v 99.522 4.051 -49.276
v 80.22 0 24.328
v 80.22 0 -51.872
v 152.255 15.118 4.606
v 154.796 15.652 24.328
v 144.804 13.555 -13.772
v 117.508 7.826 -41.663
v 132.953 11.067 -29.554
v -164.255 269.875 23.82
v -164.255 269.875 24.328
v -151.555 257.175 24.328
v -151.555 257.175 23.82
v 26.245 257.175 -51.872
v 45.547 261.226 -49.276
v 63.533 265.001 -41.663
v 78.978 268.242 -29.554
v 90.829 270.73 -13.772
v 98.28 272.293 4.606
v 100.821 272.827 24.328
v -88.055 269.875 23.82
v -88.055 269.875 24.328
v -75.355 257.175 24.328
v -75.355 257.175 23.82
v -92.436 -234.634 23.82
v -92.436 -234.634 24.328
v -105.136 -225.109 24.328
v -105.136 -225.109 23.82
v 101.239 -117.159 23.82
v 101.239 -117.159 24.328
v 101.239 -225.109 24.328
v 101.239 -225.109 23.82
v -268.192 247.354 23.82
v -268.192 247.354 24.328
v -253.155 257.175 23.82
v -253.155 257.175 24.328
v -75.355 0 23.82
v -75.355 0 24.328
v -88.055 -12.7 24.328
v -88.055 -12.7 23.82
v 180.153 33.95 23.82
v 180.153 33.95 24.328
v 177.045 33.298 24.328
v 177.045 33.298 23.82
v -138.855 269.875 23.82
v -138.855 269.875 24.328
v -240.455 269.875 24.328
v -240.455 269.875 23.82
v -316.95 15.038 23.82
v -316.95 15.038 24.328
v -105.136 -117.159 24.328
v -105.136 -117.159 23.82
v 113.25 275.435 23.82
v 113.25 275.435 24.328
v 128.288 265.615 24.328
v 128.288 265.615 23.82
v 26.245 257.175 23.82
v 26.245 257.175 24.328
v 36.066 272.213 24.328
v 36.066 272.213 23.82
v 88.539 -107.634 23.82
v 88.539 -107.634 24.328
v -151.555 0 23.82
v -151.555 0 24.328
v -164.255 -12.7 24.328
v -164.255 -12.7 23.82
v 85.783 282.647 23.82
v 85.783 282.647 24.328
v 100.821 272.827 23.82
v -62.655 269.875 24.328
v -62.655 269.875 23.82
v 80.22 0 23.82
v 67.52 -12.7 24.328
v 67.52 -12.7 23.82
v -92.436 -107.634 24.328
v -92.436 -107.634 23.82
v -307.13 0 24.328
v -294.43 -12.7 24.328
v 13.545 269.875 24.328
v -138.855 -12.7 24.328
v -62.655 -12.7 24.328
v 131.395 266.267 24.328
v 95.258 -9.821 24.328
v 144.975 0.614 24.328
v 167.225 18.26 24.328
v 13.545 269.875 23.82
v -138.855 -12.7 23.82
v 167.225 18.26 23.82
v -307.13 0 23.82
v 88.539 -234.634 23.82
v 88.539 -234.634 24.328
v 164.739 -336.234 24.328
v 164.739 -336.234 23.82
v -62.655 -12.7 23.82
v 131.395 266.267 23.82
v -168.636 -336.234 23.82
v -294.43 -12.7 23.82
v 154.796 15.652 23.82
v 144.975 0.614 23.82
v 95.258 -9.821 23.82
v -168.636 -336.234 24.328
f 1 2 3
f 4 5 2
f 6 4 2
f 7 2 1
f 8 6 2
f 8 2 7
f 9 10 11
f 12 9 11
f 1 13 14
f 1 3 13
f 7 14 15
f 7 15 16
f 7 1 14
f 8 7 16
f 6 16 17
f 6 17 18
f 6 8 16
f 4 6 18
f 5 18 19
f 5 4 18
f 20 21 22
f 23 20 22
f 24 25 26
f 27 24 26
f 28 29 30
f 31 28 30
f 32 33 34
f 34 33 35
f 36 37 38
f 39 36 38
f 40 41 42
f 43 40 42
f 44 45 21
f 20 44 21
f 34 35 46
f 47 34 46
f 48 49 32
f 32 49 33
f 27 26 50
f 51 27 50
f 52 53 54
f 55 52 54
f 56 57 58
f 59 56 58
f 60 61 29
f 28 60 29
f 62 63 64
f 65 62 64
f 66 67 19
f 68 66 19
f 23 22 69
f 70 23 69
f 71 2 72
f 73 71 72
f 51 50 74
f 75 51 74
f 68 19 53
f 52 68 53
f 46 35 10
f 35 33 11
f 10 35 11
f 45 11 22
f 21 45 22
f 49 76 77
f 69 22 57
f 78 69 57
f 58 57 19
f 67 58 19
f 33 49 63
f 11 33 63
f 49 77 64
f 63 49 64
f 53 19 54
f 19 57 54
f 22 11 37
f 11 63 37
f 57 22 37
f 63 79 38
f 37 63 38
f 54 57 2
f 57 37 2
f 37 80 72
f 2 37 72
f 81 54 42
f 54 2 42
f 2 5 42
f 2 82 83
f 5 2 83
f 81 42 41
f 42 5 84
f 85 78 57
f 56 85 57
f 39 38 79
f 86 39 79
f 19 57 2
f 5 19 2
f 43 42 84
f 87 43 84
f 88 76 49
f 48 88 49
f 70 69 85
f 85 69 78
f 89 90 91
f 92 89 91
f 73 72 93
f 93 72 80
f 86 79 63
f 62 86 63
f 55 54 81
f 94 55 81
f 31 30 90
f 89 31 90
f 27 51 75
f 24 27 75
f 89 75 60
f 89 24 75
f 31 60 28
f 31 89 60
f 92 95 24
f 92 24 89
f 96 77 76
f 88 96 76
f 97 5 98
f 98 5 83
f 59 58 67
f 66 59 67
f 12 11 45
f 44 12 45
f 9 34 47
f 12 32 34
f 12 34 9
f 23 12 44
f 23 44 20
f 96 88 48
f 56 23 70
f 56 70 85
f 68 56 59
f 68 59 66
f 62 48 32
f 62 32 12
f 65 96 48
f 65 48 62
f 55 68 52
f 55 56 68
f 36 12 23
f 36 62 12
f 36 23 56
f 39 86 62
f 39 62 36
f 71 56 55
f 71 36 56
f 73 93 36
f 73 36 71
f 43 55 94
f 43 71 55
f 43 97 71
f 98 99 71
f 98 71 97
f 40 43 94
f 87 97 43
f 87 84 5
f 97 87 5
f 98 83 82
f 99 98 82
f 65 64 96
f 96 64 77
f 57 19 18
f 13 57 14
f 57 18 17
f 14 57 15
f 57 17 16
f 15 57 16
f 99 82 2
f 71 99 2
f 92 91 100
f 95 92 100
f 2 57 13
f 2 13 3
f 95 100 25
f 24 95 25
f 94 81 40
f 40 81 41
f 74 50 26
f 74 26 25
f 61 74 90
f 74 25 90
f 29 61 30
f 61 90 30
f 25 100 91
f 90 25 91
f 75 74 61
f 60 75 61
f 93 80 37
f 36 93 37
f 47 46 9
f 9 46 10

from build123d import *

# Parameters (mm, degrees)
F9_W      = 262.7780075463
F9_H      = 76.2
F10_ANGLE = 90
F11_W     = 76.2
F11_H     = 257.175
F12_DEPTH = 0.508
F11_W_2   = 180.975
F11_H_2   = 101.6


with BuildPart() as f10:
    # F9 (on face) → F10 (revolve)
    with BuildSketch(Plane(origin=(76.8359391057, 16.1260612938, 0), x_dir=(0.2054015117, -0.9786777912, 0), z_dir=(-0.9786777912, -0.2054015117, 0))):
        with Locations((-114.9116080063, -13.7723366184)):
            Rectangle(F9_W, F9_H)
    revolve(axis=Axis((53.2329211056, 128.5875, 24.3276633816), (0.2054015117, -0.9786777912, 0)), revolution_arc=F10_ANGLE)


with BuildPart() as f12:
    # F11 (on face) → F12 (new body)
    with BuildSketch(Plane(origin=(0, 0, 24.3276633816), x_dir=(1, 0, 0), z_dir=(0, 0, -1))):
        Polygon((80.2204211056, 0), (26.2454211056, -257.175), (100.8206687947, -272.826595194), (154.7956687947, -15.651595194), align=None)
        Polygon((-75.3545788944, -257.175), (26.2454211056, -257.175), (80.2204211056, 0), (-75.3545788944, 0), align=None)
        Polygon((13.5454211056, -269.875), (26.2454211056, -257.175), (-75.3545788944, -257.175), (-62.6545788944, -269.875), align=None)
        Polygon((100.8206687947, -272.826595194), (26.2454211056, -257.175), (36.0660298548, -272.2128071472), (85.7828616475, -282.6472039432), align=None)
        Polygon((154.7956687947, -15.651595194), (100.8206687947, -272.826595194), (113.2498767428, -275.435194393), (167.2248767428, -18.260194393), align=None)
        Polygon((95.2582282528, 9.8206087492), (80.2204211056, 0), (154.7956687947, -15.651595194), (144.9750600455, -0.6137880468), align=None)
        Polygon((-75.3545788944, 0), (80.2204211056, 0), (67.5204211056, 12.7), (-62.6545788944, 12.7), align=None)
        Polygon((-88.0545788944, -269.875), (-75.3545788944, -257.175), (-151.5545788944, -257.175), (-138.8545788944, -269.875), align=None)
        with Locations((-113.4545788944, -128.5875)):
            Rectangle(F11_W, F11_H)
        Polygon((167.2248767428, -18.260194393), (113.2498767428, -275.435194393), (128.28768389, -265.6145856438), (177.045485492, -33.2980015402), align=None)
        Polygon((-151.5545788944, 0), (-75.3545788944, 0), (-88.0545788944, 12.7), (-138.8545788944, 12.7), align=None)
        Polygon((-253.1545788944, -257.175), (-151.5545788944, -257.175), (-151.5545788944, 0), (-307.1295788944, 0), align=None)
        Polygon((-164.2545788944, -269.875), (-151.5545788944, -257.175), (-253.1545788944, -257.175), (-240.4545788944, -269.875), align=None)
        Polygon((177.045485492, -33.2980015402), (128.28768389, -265.6145856438), (131.3949858771, -266.2667354436), (180.1527874791, -33.9501513399), align=None)
        Polygon((-307.1295788944, 0), (-151.5545788944, 0), (-164.2545788944, 12.7), (-294.4295788944, 12.7), align=None)
        Polygon((-268.1923860416, -247.3543912508), (-253.1545788944, -257.175), (-307.1295788944, 0), (-316.9501876436, -15.0378071472), align=None)
    extrude(amount=F12_DEPTH)


with BuildPart() as f12b:
    # F11 (on face) → F12, piece 2 (new body)
    with BuildSketch(Plane(origin=(0, 0, 24.3276633816), x_dir=(1, 0, 0), z_dir=(0, 0, -1))):
        with Locations((-1.9481492972, 285.4342016459)):
            Rectangle(F11_W_2, F11_H_2)
        Polygon((-168.6356492972, 336.2342016459), (-92.4356492972, 234.6342016459), (-92.4356492972, 336.2342016459), align=None)
        Polygon((88.5393507028, 234.6342016459), (-92.4356492972, 234.6342016459), (-105.1356492972, 225.1092016459), (-105.1356492972, 117.1592016459), (-92.4356492972, 107.6342016459), (88.5393507028, 107.6342016459), (101.2393507028, 117.1592016459), (101.2393507028, 225.1092016459), align=None)
        Polygon((88.5393507028, 336.2342016459), (88.5393507028, 234.6342016459), (164.7393507028, 336.2342016459), align=None)
    extrude(amount=F12_DEPTH)


solid = Compound([f10.part, f12.part, f12b.part])
